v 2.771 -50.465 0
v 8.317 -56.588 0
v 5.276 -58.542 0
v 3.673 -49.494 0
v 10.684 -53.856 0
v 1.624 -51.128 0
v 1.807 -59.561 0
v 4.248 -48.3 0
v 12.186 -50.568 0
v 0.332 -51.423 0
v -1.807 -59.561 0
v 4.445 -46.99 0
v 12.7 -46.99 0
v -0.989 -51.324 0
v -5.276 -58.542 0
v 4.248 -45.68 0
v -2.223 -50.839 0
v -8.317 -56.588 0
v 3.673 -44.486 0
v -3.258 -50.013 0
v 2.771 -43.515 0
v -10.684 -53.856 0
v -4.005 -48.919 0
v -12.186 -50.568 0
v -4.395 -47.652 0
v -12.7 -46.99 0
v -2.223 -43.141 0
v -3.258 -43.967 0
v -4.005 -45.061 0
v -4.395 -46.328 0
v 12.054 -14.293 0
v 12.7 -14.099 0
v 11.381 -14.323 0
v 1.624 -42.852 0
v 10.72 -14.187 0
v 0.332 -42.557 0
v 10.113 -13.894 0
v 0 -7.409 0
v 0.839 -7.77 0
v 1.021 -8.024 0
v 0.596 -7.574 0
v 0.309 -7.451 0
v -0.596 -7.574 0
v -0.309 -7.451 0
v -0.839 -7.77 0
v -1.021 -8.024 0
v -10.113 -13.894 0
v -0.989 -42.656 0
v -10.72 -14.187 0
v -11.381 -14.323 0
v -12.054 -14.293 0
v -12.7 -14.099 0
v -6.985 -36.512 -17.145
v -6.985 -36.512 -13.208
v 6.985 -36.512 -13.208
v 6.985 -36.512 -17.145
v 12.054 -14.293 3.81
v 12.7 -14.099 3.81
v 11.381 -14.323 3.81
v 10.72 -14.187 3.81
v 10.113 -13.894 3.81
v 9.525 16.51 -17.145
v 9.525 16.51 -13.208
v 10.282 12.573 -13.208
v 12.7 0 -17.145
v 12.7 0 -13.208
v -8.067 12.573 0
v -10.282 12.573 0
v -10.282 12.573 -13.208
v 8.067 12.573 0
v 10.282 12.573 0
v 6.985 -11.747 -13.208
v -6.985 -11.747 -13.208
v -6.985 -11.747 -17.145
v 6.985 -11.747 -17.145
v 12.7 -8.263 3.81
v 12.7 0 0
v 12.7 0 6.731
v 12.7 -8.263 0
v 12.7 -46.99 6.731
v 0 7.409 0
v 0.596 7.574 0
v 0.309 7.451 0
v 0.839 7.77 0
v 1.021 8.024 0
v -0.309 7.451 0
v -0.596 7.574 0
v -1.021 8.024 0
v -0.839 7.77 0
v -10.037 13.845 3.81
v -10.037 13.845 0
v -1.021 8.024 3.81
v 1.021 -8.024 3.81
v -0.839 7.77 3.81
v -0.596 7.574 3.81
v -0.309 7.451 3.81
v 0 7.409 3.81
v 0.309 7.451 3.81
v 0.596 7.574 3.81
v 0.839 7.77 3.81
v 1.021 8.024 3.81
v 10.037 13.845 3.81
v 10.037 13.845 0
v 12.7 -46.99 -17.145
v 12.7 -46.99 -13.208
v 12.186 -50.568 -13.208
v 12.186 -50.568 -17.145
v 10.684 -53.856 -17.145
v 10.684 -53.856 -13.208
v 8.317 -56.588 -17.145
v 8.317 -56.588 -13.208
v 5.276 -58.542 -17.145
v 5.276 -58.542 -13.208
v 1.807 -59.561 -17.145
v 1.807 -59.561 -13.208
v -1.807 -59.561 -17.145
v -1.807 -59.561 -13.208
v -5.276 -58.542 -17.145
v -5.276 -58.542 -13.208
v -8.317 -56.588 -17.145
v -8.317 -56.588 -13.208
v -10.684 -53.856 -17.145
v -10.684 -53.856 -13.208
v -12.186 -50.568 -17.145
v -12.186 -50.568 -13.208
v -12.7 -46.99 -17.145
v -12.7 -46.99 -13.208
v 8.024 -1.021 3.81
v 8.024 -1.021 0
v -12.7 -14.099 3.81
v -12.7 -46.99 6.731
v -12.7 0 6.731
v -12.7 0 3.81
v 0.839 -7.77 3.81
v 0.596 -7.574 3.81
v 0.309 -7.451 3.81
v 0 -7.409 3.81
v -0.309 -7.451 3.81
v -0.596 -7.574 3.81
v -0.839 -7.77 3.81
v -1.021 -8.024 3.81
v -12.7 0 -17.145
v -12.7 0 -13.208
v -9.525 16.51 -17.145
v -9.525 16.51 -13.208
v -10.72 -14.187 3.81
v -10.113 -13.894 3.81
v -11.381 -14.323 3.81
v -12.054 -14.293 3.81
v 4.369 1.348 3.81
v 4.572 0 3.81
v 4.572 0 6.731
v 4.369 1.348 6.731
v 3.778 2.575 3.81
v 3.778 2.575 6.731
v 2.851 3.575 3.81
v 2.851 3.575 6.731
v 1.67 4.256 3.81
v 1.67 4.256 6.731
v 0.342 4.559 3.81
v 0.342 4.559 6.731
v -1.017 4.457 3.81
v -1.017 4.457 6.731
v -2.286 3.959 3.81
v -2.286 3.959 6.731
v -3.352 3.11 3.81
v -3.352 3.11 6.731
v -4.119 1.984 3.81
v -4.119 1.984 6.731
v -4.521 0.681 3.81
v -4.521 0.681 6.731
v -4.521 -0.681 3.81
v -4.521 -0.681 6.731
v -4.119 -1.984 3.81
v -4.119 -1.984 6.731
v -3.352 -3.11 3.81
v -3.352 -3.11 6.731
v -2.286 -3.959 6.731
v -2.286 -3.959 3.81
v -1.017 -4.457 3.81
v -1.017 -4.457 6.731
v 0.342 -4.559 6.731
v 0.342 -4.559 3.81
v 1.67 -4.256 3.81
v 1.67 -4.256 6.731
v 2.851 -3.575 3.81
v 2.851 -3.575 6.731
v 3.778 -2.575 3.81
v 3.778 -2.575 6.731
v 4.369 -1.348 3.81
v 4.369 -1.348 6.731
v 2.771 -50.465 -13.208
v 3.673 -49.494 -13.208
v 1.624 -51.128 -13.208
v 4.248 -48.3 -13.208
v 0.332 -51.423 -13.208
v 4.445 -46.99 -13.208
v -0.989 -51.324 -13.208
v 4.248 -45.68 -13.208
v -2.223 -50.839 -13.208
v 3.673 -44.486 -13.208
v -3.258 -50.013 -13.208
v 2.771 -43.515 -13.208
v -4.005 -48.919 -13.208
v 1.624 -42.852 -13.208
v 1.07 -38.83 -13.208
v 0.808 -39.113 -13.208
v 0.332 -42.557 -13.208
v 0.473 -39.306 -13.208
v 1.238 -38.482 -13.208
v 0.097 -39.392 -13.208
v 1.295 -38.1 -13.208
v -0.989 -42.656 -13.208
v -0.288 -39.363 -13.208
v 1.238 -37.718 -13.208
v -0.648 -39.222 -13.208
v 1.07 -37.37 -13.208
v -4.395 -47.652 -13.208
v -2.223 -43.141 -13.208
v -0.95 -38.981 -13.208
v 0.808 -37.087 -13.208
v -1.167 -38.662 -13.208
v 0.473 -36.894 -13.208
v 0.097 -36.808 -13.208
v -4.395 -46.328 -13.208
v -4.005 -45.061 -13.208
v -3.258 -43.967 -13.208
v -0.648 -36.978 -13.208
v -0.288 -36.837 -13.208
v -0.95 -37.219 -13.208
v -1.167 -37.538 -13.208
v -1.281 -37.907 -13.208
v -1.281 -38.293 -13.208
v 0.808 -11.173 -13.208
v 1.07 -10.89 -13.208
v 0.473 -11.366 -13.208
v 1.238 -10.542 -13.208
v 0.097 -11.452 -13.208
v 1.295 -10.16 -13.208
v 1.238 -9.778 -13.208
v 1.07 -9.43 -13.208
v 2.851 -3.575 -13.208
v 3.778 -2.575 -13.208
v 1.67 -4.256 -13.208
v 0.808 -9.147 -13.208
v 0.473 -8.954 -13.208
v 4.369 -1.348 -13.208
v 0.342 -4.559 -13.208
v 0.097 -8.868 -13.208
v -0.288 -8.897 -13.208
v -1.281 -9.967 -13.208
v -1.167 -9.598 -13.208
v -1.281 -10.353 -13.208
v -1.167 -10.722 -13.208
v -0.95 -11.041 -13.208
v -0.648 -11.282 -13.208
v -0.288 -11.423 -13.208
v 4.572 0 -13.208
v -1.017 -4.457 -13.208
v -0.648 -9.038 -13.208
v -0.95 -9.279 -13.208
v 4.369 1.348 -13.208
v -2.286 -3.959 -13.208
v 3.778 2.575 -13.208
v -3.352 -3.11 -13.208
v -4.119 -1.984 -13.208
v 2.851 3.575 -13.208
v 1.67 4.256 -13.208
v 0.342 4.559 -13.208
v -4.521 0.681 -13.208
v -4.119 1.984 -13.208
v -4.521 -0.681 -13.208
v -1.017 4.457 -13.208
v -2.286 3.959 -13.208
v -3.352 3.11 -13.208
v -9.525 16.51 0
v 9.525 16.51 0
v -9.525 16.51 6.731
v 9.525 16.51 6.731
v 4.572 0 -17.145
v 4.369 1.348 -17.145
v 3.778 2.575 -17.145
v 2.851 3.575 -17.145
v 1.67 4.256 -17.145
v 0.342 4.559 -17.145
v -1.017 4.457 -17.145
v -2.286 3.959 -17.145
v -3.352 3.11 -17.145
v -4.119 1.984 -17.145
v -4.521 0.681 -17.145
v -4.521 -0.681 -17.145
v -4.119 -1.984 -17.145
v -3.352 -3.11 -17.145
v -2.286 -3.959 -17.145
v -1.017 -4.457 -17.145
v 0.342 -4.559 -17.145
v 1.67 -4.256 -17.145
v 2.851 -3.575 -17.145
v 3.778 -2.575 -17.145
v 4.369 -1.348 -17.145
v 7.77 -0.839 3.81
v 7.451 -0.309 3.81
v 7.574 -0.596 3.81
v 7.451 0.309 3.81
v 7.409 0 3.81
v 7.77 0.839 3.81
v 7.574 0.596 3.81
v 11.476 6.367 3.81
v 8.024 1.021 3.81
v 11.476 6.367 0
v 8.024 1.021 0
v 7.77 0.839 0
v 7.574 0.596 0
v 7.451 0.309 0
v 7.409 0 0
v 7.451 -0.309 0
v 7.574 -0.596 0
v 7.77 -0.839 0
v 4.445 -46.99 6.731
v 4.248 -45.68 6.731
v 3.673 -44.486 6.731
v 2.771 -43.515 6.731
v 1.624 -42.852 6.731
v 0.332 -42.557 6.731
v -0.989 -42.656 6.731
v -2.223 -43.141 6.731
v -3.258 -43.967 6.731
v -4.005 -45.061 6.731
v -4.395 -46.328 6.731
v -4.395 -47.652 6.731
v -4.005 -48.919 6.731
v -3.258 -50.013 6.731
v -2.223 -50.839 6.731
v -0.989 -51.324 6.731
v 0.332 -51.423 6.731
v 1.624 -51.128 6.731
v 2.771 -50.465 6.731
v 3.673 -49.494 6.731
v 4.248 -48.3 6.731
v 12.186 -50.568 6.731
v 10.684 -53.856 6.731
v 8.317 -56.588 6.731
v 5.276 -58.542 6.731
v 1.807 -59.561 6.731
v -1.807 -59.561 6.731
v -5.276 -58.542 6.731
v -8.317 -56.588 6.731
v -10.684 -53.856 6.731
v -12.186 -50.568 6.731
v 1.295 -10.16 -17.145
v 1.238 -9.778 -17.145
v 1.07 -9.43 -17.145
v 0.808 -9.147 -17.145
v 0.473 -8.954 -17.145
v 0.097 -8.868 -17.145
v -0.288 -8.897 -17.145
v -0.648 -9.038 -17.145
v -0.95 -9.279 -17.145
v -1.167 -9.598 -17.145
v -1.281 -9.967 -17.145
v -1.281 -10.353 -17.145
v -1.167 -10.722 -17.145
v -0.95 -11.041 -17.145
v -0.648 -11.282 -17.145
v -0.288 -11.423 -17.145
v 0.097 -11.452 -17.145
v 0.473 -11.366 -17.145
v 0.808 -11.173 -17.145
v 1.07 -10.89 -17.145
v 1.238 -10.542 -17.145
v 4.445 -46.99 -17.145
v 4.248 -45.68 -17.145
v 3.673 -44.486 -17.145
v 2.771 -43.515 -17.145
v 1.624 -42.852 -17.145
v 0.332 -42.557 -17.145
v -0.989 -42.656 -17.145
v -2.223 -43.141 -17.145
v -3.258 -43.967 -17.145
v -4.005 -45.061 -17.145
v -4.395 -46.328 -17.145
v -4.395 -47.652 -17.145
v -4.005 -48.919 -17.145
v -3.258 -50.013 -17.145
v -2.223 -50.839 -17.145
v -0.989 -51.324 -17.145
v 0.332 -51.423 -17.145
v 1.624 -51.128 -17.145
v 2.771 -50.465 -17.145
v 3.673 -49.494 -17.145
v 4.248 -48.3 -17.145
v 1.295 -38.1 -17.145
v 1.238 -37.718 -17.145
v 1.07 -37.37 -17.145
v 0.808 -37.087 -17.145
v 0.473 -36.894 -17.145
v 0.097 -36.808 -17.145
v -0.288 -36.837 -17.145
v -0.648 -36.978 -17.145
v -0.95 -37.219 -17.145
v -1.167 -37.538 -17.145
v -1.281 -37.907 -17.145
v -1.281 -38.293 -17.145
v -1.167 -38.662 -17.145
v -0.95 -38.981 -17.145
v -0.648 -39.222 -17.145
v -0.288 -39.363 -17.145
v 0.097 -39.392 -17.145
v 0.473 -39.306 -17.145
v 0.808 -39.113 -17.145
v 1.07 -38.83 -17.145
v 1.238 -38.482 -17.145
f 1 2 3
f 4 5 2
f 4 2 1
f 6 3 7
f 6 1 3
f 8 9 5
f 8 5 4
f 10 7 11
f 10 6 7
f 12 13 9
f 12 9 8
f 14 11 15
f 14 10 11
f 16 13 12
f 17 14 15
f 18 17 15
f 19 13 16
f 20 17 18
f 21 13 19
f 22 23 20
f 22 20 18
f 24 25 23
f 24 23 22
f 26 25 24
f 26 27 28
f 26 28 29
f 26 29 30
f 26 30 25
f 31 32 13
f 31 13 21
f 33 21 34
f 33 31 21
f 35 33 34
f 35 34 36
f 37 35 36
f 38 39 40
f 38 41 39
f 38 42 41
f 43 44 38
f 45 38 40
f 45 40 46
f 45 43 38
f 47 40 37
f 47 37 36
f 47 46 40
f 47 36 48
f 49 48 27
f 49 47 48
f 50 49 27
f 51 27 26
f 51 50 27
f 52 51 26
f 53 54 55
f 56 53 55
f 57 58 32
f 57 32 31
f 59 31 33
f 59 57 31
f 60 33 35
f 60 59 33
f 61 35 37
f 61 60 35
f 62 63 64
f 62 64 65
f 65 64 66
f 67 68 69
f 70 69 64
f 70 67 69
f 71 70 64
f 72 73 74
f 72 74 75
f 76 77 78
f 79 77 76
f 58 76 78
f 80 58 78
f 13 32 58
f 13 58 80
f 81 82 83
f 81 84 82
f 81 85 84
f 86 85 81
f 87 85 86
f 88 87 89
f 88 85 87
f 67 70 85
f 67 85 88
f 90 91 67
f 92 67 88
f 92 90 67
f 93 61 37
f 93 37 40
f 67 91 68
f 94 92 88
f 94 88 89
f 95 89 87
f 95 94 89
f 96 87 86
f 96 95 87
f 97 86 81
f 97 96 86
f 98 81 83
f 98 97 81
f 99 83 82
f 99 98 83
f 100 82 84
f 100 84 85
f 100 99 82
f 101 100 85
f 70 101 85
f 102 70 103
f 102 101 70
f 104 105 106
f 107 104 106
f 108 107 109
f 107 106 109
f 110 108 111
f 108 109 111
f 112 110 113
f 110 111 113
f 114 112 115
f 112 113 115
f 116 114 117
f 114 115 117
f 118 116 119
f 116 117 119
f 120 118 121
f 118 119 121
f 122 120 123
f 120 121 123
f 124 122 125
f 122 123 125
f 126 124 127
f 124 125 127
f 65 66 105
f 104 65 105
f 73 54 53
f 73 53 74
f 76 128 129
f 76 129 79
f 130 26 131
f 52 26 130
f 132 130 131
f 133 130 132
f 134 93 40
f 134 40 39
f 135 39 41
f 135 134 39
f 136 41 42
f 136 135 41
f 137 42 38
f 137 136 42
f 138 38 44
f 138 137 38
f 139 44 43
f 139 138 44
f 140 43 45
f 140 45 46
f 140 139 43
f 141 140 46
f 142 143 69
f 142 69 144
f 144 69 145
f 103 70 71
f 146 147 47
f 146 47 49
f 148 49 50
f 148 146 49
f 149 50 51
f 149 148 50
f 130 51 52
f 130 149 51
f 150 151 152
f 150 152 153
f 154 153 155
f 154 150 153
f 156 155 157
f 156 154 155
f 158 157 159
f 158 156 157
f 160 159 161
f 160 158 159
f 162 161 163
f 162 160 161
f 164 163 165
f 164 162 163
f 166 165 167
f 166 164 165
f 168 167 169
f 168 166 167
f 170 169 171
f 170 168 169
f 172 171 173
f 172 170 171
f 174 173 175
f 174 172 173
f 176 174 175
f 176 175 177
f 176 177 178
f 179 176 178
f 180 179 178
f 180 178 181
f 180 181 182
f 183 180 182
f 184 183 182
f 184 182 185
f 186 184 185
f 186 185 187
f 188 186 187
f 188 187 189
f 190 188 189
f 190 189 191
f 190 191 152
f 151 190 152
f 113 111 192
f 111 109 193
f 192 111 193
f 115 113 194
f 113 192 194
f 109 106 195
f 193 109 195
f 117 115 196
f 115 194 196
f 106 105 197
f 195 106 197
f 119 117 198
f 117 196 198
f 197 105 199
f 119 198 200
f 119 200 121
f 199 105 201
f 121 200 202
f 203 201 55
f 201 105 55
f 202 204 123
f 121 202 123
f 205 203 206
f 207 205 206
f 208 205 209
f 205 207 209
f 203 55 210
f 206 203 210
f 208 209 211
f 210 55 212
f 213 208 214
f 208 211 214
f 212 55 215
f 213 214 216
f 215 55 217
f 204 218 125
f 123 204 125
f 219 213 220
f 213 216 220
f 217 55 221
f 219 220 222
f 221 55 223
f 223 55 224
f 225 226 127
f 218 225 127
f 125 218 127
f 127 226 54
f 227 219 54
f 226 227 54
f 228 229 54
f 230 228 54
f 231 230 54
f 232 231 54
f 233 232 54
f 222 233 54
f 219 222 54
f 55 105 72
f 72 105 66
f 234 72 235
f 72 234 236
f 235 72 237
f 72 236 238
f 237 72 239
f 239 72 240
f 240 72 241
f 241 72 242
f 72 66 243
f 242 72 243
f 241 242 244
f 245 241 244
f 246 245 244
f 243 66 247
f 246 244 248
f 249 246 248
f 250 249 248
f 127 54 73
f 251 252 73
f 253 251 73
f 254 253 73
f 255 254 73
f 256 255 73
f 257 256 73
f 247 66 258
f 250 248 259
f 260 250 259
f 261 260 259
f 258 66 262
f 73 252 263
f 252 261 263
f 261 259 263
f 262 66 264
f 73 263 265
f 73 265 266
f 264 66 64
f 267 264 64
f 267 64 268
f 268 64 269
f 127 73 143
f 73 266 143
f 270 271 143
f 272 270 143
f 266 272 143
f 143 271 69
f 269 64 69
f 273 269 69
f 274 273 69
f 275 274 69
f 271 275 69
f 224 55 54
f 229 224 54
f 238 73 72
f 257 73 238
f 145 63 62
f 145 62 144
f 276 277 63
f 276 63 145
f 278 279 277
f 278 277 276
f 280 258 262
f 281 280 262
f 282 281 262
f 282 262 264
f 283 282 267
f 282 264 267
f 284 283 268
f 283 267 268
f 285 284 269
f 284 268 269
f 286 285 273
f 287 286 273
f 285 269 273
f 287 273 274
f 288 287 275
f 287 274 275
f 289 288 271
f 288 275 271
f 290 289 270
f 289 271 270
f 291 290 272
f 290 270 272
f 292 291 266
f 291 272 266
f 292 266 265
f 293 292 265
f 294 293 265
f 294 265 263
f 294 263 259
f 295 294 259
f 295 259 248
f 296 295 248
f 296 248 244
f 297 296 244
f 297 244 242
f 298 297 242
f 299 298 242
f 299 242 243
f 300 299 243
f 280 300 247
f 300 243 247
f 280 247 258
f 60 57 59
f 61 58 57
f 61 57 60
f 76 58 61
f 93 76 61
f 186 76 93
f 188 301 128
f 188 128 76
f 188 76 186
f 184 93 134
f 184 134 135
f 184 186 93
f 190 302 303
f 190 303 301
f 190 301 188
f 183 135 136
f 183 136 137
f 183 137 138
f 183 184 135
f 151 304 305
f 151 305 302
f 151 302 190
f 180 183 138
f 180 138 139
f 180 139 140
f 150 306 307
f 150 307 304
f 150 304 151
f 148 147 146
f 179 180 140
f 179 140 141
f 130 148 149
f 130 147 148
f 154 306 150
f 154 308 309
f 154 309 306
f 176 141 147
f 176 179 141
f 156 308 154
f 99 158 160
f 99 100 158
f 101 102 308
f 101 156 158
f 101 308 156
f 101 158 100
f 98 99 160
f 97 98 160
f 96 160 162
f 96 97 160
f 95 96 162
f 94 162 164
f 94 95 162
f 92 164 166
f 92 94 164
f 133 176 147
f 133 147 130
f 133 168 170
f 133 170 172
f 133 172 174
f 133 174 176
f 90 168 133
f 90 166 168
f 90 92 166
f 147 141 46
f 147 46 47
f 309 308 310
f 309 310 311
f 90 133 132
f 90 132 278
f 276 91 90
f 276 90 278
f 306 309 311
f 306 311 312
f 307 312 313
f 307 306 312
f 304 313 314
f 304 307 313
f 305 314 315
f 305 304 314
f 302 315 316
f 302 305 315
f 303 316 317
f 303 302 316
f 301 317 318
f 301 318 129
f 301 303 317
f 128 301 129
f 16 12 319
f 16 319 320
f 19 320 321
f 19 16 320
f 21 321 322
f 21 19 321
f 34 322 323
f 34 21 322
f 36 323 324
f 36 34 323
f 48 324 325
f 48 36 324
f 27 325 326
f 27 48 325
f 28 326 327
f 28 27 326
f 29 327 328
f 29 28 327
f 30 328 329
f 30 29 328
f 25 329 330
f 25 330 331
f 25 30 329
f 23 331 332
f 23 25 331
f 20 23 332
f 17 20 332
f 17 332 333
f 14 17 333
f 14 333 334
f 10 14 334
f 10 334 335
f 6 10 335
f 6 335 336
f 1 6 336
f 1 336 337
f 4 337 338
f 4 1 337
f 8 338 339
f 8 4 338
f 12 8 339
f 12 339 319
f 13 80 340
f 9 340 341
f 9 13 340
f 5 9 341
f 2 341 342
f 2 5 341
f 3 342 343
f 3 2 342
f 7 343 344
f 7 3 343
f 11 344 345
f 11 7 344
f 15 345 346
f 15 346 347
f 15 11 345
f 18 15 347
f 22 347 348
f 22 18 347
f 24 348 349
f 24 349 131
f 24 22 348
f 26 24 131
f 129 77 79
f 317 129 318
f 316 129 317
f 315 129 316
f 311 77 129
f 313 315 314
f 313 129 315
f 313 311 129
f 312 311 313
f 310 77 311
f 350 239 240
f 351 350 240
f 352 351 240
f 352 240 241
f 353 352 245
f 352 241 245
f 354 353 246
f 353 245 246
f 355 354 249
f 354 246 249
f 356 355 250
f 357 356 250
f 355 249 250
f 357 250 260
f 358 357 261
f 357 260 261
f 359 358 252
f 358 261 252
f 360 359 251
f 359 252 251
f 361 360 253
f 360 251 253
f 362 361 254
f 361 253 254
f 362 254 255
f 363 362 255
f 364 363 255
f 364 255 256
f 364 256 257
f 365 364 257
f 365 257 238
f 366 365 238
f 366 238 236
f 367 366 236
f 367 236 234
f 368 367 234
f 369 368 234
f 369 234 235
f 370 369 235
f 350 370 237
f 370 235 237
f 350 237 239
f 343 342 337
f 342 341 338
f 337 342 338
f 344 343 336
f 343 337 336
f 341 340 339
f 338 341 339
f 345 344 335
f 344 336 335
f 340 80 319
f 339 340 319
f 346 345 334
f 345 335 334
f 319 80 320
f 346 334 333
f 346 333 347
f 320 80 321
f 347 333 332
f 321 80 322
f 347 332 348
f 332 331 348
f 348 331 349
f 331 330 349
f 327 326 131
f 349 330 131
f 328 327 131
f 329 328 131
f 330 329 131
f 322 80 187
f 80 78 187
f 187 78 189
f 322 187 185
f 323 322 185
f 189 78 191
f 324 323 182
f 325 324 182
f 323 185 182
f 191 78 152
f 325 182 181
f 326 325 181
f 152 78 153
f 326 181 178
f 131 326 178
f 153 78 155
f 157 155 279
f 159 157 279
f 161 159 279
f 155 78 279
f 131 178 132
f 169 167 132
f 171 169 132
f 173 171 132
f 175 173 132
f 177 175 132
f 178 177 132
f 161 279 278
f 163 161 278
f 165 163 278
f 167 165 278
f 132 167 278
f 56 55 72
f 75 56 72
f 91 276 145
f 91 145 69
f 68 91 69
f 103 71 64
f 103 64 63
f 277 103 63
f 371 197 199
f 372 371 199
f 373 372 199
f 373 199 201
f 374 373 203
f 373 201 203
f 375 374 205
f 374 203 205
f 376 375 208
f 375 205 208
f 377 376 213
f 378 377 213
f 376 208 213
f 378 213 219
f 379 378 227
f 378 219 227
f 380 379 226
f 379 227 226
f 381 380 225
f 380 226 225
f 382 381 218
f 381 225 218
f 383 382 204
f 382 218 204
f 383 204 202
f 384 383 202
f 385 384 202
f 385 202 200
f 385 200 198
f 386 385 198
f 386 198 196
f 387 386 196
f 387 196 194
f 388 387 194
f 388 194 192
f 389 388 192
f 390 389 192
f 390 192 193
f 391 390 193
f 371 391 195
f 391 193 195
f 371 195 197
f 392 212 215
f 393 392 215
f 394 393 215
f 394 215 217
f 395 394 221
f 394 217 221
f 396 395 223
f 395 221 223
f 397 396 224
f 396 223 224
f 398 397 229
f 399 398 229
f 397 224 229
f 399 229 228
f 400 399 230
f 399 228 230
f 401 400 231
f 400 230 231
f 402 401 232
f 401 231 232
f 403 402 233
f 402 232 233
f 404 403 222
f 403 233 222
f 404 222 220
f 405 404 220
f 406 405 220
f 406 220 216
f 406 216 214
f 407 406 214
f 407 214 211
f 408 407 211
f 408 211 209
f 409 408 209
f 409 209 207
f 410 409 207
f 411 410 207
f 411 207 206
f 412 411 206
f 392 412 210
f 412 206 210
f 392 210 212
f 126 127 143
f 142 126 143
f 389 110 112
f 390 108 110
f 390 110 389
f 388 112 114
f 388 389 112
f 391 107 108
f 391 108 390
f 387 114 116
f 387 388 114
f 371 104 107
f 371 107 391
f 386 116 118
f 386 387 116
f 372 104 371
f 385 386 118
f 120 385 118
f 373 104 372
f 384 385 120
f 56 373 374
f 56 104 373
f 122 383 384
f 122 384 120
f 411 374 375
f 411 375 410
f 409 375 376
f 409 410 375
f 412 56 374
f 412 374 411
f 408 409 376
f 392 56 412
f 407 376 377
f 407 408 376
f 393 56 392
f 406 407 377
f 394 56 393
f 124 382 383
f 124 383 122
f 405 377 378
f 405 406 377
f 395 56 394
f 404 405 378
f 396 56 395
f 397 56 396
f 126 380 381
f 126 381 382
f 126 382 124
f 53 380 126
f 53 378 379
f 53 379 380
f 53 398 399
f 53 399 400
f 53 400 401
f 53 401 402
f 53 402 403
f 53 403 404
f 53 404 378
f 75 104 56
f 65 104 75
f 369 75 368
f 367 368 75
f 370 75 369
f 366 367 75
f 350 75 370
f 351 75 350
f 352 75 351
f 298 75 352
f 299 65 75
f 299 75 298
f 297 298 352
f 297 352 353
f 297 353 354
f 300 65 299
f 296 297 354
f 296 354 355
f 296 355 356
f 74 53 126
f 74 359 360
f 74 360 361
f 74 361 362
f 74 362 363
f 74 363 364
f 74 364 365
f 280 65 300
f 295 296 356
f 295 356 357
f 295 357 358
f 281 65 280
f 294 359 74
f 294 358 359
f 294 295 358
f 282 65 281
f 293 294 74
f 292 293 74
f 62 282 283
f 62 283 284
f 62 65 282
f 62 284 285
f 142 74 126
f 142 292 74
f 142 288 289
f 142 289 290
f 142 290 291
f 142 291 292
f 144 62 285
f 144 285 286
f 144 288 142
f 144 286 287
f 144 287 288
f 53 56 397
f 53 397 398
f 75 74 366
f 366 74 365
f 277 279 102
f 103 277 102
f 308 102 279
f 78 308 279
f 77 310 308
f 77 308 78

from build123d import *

# Parameters (mm, degrees)
SKETCH1_R              = 4.572
SKETCH1_R_2            = 4.445
BOSS_EXTRUDE1_DEPTH    = 6.731
BOSS_EXTRUDE3_START    = -13.208
SKETCH1_5_R            = 4.572
SKETCH1_5_R_2          = 1.2954
SKETCH1_5_R_3          = 4.445
SKETCH1_5_W            = 13.97
SKETCH1_5_H            = 24.765
BOSS_EXTRUDE3_DEPTH    = 3.937
CUT_EXTRUDE4_START     = -3.81
CUT_EXTRUDE4_OUTLINE_R = 4.572
CUT_EXTRUDE4_DEPTH     = 3.81
BOSS_EXTRUDE5_DEPTH    = 16.4211


# Read off the part's stored shape, not the designer's step: Cut-Extrude4
with BuildPart() as part:
    # Sketch1 (on Front Plane) → Boss-Extrude1 (new body)
    with BuildSketch(Plane.XY):
        with BuildLine():
            Line((-12.7, 0), (-9.525, 16.51))
            Line((-9.525, 16.51), (9.525, 16.51))
            Line((9.525, 16.51), (12.7, 0))
            Line((12.7, 0), (12.7, -46.99))
            ThreePointArc((12.7, -46.99), (0, -59.69), (-12.7, -46.99))
            Line((-12.7, -46.99), (-12.7, 0))
        make_face()
        Circle(SKETCH1_R, mode=Mode.SUBTRACT)
        with Locations((0, -46.99)):
            Circle(SKETCH1_R_2, mode=Mode.SUBTRACT)
    extrude(amount=BOSS_EXTRUDE1_DEPTH)

    # Cut-Extrude4 outline → Cut-Extrude4 (cut)
    with BuildSketch(Plane(origin=(0, 0, 0), x_dir=(-1, 0, 0), z_dir=(0, 0, -1)).offset(CUT_EXTRUDE4_START)):
        with BuildLine():
            Line((1.021082558, -8.023816422), (10.113003756, -13.894226547))
            ThreePointArc((10.113003756, -13.894226547), (11.380658922, -14.323016968), (12.7, -14.099075092))
            Line((12.7, -14.099075092), (12.7, 0))
            Line((12.7, 0), (10.037418608, 13.84542324))
            Line((10.037418608, 13.84542324), (1.021082558, 8.023816422))
            ThreePointArc((1.021082558, 8.023816422), (0, 7.408645479), (-1.021082558, 8.023816422))
            Line((-1.021082558, 8.023816422), (-10.037418608, 13.84542324))
            Line((-10.037418608, 13.84542324), (-11.47556666, 6.367053366))
            Line((-11.47556666, 6.367053366), (-8.023816422, 1.021082558))
            ThreePointArc((-8.023816422, 1.021082558), (-7.408645479, 0), (-8.023816422, -1.021082558))
            Line((-8.023816422, -1.021082558), (-12.7, -8.263420264))
            Line((-12.7, -8.263420264), (-12.7, -14.099075092))
            ThreePointArc((-12.7, -14.099075092), (-11.380658922, -14.323016968), (-10.113003756, -13.894226547))
            Line((-10.113003756, -13.894226547), (-1.021082558, -8.023816422))
            ThreePointArc((-1.021082558, -8.023816422), (0, -7.408645479), (1.021082558, -8.023816422))
        make_face()
        Circle(CUT_EXTRUDE4_OUTLINE_R, mode=Mode.SUBTRACT)
    extrude(amount=CUT_EXTRUDE4_DEPTH, mode=Mode.SUBTRACT)



with BuildPart() as body_2:
    # Sketch1<5> → Boss-Extrude3 (new body)
    with BuildSketch(Plane.XY.offset(BOSS_EXTRUDE3_START)):
        with BuildLine():
            Line((-12.7, 0), (-9.525, 16.51))
            Line((-9.525, 16.51), (9.525, 16.51))
            Line((9.525, 16.51), (12.7, 0))
            Line((12.7, 0), (12.7, -46.99))
            ThreePointArc((12.7, -46.99), (0, -59.69), (-12.7, -46.99))
            Line((-12.7, -46.99), (-12.7, 0))
        make_face()
        Circle(SKETCH1_5_R, mode=Mode.SUBTRACT)
        with Locations((0, -10.16)):
            Circle(SKETCH1_5_R_2, mode=Mode.SUBTRACT)
        with Locations((0, -38.1)):
            Circle(SKETCH1_5_R_2, mode=Mode.SUBTRACT)
        with Locations((0, -46.99)):
            Circle(SKETCH1_5_R_3, mode=Mode.SUBTRACT)
        with Locations((0, -24.13)):
            Rectangle(SKETCH1_5_W, SKETCH1_5_H, mode=Mode.SUBTRACT)
    extrude(amount=-BOSS_EXTRUDE3_DEPTH)


with BuildPart() as part_1:
    add(part.part)

    add(body_2.part)  # Boss-Extrude5 merges body 2
    # Sketch5 → Boss-Extrude5 (add)
    with BuildSketch(Plane(origin=(0, 0, 0), x_dir=(-1, 0, 0), z_dir=(0, 0, -1))):
        Polygon((-9.525, 16.51), (9.525, 16.51), (10.282115385, 12.573), (-10.282115385, 12.573), align=None)
    extrude(amount=BOSS_EXTRUDE5_DEPTH)


solid = part_1.part
